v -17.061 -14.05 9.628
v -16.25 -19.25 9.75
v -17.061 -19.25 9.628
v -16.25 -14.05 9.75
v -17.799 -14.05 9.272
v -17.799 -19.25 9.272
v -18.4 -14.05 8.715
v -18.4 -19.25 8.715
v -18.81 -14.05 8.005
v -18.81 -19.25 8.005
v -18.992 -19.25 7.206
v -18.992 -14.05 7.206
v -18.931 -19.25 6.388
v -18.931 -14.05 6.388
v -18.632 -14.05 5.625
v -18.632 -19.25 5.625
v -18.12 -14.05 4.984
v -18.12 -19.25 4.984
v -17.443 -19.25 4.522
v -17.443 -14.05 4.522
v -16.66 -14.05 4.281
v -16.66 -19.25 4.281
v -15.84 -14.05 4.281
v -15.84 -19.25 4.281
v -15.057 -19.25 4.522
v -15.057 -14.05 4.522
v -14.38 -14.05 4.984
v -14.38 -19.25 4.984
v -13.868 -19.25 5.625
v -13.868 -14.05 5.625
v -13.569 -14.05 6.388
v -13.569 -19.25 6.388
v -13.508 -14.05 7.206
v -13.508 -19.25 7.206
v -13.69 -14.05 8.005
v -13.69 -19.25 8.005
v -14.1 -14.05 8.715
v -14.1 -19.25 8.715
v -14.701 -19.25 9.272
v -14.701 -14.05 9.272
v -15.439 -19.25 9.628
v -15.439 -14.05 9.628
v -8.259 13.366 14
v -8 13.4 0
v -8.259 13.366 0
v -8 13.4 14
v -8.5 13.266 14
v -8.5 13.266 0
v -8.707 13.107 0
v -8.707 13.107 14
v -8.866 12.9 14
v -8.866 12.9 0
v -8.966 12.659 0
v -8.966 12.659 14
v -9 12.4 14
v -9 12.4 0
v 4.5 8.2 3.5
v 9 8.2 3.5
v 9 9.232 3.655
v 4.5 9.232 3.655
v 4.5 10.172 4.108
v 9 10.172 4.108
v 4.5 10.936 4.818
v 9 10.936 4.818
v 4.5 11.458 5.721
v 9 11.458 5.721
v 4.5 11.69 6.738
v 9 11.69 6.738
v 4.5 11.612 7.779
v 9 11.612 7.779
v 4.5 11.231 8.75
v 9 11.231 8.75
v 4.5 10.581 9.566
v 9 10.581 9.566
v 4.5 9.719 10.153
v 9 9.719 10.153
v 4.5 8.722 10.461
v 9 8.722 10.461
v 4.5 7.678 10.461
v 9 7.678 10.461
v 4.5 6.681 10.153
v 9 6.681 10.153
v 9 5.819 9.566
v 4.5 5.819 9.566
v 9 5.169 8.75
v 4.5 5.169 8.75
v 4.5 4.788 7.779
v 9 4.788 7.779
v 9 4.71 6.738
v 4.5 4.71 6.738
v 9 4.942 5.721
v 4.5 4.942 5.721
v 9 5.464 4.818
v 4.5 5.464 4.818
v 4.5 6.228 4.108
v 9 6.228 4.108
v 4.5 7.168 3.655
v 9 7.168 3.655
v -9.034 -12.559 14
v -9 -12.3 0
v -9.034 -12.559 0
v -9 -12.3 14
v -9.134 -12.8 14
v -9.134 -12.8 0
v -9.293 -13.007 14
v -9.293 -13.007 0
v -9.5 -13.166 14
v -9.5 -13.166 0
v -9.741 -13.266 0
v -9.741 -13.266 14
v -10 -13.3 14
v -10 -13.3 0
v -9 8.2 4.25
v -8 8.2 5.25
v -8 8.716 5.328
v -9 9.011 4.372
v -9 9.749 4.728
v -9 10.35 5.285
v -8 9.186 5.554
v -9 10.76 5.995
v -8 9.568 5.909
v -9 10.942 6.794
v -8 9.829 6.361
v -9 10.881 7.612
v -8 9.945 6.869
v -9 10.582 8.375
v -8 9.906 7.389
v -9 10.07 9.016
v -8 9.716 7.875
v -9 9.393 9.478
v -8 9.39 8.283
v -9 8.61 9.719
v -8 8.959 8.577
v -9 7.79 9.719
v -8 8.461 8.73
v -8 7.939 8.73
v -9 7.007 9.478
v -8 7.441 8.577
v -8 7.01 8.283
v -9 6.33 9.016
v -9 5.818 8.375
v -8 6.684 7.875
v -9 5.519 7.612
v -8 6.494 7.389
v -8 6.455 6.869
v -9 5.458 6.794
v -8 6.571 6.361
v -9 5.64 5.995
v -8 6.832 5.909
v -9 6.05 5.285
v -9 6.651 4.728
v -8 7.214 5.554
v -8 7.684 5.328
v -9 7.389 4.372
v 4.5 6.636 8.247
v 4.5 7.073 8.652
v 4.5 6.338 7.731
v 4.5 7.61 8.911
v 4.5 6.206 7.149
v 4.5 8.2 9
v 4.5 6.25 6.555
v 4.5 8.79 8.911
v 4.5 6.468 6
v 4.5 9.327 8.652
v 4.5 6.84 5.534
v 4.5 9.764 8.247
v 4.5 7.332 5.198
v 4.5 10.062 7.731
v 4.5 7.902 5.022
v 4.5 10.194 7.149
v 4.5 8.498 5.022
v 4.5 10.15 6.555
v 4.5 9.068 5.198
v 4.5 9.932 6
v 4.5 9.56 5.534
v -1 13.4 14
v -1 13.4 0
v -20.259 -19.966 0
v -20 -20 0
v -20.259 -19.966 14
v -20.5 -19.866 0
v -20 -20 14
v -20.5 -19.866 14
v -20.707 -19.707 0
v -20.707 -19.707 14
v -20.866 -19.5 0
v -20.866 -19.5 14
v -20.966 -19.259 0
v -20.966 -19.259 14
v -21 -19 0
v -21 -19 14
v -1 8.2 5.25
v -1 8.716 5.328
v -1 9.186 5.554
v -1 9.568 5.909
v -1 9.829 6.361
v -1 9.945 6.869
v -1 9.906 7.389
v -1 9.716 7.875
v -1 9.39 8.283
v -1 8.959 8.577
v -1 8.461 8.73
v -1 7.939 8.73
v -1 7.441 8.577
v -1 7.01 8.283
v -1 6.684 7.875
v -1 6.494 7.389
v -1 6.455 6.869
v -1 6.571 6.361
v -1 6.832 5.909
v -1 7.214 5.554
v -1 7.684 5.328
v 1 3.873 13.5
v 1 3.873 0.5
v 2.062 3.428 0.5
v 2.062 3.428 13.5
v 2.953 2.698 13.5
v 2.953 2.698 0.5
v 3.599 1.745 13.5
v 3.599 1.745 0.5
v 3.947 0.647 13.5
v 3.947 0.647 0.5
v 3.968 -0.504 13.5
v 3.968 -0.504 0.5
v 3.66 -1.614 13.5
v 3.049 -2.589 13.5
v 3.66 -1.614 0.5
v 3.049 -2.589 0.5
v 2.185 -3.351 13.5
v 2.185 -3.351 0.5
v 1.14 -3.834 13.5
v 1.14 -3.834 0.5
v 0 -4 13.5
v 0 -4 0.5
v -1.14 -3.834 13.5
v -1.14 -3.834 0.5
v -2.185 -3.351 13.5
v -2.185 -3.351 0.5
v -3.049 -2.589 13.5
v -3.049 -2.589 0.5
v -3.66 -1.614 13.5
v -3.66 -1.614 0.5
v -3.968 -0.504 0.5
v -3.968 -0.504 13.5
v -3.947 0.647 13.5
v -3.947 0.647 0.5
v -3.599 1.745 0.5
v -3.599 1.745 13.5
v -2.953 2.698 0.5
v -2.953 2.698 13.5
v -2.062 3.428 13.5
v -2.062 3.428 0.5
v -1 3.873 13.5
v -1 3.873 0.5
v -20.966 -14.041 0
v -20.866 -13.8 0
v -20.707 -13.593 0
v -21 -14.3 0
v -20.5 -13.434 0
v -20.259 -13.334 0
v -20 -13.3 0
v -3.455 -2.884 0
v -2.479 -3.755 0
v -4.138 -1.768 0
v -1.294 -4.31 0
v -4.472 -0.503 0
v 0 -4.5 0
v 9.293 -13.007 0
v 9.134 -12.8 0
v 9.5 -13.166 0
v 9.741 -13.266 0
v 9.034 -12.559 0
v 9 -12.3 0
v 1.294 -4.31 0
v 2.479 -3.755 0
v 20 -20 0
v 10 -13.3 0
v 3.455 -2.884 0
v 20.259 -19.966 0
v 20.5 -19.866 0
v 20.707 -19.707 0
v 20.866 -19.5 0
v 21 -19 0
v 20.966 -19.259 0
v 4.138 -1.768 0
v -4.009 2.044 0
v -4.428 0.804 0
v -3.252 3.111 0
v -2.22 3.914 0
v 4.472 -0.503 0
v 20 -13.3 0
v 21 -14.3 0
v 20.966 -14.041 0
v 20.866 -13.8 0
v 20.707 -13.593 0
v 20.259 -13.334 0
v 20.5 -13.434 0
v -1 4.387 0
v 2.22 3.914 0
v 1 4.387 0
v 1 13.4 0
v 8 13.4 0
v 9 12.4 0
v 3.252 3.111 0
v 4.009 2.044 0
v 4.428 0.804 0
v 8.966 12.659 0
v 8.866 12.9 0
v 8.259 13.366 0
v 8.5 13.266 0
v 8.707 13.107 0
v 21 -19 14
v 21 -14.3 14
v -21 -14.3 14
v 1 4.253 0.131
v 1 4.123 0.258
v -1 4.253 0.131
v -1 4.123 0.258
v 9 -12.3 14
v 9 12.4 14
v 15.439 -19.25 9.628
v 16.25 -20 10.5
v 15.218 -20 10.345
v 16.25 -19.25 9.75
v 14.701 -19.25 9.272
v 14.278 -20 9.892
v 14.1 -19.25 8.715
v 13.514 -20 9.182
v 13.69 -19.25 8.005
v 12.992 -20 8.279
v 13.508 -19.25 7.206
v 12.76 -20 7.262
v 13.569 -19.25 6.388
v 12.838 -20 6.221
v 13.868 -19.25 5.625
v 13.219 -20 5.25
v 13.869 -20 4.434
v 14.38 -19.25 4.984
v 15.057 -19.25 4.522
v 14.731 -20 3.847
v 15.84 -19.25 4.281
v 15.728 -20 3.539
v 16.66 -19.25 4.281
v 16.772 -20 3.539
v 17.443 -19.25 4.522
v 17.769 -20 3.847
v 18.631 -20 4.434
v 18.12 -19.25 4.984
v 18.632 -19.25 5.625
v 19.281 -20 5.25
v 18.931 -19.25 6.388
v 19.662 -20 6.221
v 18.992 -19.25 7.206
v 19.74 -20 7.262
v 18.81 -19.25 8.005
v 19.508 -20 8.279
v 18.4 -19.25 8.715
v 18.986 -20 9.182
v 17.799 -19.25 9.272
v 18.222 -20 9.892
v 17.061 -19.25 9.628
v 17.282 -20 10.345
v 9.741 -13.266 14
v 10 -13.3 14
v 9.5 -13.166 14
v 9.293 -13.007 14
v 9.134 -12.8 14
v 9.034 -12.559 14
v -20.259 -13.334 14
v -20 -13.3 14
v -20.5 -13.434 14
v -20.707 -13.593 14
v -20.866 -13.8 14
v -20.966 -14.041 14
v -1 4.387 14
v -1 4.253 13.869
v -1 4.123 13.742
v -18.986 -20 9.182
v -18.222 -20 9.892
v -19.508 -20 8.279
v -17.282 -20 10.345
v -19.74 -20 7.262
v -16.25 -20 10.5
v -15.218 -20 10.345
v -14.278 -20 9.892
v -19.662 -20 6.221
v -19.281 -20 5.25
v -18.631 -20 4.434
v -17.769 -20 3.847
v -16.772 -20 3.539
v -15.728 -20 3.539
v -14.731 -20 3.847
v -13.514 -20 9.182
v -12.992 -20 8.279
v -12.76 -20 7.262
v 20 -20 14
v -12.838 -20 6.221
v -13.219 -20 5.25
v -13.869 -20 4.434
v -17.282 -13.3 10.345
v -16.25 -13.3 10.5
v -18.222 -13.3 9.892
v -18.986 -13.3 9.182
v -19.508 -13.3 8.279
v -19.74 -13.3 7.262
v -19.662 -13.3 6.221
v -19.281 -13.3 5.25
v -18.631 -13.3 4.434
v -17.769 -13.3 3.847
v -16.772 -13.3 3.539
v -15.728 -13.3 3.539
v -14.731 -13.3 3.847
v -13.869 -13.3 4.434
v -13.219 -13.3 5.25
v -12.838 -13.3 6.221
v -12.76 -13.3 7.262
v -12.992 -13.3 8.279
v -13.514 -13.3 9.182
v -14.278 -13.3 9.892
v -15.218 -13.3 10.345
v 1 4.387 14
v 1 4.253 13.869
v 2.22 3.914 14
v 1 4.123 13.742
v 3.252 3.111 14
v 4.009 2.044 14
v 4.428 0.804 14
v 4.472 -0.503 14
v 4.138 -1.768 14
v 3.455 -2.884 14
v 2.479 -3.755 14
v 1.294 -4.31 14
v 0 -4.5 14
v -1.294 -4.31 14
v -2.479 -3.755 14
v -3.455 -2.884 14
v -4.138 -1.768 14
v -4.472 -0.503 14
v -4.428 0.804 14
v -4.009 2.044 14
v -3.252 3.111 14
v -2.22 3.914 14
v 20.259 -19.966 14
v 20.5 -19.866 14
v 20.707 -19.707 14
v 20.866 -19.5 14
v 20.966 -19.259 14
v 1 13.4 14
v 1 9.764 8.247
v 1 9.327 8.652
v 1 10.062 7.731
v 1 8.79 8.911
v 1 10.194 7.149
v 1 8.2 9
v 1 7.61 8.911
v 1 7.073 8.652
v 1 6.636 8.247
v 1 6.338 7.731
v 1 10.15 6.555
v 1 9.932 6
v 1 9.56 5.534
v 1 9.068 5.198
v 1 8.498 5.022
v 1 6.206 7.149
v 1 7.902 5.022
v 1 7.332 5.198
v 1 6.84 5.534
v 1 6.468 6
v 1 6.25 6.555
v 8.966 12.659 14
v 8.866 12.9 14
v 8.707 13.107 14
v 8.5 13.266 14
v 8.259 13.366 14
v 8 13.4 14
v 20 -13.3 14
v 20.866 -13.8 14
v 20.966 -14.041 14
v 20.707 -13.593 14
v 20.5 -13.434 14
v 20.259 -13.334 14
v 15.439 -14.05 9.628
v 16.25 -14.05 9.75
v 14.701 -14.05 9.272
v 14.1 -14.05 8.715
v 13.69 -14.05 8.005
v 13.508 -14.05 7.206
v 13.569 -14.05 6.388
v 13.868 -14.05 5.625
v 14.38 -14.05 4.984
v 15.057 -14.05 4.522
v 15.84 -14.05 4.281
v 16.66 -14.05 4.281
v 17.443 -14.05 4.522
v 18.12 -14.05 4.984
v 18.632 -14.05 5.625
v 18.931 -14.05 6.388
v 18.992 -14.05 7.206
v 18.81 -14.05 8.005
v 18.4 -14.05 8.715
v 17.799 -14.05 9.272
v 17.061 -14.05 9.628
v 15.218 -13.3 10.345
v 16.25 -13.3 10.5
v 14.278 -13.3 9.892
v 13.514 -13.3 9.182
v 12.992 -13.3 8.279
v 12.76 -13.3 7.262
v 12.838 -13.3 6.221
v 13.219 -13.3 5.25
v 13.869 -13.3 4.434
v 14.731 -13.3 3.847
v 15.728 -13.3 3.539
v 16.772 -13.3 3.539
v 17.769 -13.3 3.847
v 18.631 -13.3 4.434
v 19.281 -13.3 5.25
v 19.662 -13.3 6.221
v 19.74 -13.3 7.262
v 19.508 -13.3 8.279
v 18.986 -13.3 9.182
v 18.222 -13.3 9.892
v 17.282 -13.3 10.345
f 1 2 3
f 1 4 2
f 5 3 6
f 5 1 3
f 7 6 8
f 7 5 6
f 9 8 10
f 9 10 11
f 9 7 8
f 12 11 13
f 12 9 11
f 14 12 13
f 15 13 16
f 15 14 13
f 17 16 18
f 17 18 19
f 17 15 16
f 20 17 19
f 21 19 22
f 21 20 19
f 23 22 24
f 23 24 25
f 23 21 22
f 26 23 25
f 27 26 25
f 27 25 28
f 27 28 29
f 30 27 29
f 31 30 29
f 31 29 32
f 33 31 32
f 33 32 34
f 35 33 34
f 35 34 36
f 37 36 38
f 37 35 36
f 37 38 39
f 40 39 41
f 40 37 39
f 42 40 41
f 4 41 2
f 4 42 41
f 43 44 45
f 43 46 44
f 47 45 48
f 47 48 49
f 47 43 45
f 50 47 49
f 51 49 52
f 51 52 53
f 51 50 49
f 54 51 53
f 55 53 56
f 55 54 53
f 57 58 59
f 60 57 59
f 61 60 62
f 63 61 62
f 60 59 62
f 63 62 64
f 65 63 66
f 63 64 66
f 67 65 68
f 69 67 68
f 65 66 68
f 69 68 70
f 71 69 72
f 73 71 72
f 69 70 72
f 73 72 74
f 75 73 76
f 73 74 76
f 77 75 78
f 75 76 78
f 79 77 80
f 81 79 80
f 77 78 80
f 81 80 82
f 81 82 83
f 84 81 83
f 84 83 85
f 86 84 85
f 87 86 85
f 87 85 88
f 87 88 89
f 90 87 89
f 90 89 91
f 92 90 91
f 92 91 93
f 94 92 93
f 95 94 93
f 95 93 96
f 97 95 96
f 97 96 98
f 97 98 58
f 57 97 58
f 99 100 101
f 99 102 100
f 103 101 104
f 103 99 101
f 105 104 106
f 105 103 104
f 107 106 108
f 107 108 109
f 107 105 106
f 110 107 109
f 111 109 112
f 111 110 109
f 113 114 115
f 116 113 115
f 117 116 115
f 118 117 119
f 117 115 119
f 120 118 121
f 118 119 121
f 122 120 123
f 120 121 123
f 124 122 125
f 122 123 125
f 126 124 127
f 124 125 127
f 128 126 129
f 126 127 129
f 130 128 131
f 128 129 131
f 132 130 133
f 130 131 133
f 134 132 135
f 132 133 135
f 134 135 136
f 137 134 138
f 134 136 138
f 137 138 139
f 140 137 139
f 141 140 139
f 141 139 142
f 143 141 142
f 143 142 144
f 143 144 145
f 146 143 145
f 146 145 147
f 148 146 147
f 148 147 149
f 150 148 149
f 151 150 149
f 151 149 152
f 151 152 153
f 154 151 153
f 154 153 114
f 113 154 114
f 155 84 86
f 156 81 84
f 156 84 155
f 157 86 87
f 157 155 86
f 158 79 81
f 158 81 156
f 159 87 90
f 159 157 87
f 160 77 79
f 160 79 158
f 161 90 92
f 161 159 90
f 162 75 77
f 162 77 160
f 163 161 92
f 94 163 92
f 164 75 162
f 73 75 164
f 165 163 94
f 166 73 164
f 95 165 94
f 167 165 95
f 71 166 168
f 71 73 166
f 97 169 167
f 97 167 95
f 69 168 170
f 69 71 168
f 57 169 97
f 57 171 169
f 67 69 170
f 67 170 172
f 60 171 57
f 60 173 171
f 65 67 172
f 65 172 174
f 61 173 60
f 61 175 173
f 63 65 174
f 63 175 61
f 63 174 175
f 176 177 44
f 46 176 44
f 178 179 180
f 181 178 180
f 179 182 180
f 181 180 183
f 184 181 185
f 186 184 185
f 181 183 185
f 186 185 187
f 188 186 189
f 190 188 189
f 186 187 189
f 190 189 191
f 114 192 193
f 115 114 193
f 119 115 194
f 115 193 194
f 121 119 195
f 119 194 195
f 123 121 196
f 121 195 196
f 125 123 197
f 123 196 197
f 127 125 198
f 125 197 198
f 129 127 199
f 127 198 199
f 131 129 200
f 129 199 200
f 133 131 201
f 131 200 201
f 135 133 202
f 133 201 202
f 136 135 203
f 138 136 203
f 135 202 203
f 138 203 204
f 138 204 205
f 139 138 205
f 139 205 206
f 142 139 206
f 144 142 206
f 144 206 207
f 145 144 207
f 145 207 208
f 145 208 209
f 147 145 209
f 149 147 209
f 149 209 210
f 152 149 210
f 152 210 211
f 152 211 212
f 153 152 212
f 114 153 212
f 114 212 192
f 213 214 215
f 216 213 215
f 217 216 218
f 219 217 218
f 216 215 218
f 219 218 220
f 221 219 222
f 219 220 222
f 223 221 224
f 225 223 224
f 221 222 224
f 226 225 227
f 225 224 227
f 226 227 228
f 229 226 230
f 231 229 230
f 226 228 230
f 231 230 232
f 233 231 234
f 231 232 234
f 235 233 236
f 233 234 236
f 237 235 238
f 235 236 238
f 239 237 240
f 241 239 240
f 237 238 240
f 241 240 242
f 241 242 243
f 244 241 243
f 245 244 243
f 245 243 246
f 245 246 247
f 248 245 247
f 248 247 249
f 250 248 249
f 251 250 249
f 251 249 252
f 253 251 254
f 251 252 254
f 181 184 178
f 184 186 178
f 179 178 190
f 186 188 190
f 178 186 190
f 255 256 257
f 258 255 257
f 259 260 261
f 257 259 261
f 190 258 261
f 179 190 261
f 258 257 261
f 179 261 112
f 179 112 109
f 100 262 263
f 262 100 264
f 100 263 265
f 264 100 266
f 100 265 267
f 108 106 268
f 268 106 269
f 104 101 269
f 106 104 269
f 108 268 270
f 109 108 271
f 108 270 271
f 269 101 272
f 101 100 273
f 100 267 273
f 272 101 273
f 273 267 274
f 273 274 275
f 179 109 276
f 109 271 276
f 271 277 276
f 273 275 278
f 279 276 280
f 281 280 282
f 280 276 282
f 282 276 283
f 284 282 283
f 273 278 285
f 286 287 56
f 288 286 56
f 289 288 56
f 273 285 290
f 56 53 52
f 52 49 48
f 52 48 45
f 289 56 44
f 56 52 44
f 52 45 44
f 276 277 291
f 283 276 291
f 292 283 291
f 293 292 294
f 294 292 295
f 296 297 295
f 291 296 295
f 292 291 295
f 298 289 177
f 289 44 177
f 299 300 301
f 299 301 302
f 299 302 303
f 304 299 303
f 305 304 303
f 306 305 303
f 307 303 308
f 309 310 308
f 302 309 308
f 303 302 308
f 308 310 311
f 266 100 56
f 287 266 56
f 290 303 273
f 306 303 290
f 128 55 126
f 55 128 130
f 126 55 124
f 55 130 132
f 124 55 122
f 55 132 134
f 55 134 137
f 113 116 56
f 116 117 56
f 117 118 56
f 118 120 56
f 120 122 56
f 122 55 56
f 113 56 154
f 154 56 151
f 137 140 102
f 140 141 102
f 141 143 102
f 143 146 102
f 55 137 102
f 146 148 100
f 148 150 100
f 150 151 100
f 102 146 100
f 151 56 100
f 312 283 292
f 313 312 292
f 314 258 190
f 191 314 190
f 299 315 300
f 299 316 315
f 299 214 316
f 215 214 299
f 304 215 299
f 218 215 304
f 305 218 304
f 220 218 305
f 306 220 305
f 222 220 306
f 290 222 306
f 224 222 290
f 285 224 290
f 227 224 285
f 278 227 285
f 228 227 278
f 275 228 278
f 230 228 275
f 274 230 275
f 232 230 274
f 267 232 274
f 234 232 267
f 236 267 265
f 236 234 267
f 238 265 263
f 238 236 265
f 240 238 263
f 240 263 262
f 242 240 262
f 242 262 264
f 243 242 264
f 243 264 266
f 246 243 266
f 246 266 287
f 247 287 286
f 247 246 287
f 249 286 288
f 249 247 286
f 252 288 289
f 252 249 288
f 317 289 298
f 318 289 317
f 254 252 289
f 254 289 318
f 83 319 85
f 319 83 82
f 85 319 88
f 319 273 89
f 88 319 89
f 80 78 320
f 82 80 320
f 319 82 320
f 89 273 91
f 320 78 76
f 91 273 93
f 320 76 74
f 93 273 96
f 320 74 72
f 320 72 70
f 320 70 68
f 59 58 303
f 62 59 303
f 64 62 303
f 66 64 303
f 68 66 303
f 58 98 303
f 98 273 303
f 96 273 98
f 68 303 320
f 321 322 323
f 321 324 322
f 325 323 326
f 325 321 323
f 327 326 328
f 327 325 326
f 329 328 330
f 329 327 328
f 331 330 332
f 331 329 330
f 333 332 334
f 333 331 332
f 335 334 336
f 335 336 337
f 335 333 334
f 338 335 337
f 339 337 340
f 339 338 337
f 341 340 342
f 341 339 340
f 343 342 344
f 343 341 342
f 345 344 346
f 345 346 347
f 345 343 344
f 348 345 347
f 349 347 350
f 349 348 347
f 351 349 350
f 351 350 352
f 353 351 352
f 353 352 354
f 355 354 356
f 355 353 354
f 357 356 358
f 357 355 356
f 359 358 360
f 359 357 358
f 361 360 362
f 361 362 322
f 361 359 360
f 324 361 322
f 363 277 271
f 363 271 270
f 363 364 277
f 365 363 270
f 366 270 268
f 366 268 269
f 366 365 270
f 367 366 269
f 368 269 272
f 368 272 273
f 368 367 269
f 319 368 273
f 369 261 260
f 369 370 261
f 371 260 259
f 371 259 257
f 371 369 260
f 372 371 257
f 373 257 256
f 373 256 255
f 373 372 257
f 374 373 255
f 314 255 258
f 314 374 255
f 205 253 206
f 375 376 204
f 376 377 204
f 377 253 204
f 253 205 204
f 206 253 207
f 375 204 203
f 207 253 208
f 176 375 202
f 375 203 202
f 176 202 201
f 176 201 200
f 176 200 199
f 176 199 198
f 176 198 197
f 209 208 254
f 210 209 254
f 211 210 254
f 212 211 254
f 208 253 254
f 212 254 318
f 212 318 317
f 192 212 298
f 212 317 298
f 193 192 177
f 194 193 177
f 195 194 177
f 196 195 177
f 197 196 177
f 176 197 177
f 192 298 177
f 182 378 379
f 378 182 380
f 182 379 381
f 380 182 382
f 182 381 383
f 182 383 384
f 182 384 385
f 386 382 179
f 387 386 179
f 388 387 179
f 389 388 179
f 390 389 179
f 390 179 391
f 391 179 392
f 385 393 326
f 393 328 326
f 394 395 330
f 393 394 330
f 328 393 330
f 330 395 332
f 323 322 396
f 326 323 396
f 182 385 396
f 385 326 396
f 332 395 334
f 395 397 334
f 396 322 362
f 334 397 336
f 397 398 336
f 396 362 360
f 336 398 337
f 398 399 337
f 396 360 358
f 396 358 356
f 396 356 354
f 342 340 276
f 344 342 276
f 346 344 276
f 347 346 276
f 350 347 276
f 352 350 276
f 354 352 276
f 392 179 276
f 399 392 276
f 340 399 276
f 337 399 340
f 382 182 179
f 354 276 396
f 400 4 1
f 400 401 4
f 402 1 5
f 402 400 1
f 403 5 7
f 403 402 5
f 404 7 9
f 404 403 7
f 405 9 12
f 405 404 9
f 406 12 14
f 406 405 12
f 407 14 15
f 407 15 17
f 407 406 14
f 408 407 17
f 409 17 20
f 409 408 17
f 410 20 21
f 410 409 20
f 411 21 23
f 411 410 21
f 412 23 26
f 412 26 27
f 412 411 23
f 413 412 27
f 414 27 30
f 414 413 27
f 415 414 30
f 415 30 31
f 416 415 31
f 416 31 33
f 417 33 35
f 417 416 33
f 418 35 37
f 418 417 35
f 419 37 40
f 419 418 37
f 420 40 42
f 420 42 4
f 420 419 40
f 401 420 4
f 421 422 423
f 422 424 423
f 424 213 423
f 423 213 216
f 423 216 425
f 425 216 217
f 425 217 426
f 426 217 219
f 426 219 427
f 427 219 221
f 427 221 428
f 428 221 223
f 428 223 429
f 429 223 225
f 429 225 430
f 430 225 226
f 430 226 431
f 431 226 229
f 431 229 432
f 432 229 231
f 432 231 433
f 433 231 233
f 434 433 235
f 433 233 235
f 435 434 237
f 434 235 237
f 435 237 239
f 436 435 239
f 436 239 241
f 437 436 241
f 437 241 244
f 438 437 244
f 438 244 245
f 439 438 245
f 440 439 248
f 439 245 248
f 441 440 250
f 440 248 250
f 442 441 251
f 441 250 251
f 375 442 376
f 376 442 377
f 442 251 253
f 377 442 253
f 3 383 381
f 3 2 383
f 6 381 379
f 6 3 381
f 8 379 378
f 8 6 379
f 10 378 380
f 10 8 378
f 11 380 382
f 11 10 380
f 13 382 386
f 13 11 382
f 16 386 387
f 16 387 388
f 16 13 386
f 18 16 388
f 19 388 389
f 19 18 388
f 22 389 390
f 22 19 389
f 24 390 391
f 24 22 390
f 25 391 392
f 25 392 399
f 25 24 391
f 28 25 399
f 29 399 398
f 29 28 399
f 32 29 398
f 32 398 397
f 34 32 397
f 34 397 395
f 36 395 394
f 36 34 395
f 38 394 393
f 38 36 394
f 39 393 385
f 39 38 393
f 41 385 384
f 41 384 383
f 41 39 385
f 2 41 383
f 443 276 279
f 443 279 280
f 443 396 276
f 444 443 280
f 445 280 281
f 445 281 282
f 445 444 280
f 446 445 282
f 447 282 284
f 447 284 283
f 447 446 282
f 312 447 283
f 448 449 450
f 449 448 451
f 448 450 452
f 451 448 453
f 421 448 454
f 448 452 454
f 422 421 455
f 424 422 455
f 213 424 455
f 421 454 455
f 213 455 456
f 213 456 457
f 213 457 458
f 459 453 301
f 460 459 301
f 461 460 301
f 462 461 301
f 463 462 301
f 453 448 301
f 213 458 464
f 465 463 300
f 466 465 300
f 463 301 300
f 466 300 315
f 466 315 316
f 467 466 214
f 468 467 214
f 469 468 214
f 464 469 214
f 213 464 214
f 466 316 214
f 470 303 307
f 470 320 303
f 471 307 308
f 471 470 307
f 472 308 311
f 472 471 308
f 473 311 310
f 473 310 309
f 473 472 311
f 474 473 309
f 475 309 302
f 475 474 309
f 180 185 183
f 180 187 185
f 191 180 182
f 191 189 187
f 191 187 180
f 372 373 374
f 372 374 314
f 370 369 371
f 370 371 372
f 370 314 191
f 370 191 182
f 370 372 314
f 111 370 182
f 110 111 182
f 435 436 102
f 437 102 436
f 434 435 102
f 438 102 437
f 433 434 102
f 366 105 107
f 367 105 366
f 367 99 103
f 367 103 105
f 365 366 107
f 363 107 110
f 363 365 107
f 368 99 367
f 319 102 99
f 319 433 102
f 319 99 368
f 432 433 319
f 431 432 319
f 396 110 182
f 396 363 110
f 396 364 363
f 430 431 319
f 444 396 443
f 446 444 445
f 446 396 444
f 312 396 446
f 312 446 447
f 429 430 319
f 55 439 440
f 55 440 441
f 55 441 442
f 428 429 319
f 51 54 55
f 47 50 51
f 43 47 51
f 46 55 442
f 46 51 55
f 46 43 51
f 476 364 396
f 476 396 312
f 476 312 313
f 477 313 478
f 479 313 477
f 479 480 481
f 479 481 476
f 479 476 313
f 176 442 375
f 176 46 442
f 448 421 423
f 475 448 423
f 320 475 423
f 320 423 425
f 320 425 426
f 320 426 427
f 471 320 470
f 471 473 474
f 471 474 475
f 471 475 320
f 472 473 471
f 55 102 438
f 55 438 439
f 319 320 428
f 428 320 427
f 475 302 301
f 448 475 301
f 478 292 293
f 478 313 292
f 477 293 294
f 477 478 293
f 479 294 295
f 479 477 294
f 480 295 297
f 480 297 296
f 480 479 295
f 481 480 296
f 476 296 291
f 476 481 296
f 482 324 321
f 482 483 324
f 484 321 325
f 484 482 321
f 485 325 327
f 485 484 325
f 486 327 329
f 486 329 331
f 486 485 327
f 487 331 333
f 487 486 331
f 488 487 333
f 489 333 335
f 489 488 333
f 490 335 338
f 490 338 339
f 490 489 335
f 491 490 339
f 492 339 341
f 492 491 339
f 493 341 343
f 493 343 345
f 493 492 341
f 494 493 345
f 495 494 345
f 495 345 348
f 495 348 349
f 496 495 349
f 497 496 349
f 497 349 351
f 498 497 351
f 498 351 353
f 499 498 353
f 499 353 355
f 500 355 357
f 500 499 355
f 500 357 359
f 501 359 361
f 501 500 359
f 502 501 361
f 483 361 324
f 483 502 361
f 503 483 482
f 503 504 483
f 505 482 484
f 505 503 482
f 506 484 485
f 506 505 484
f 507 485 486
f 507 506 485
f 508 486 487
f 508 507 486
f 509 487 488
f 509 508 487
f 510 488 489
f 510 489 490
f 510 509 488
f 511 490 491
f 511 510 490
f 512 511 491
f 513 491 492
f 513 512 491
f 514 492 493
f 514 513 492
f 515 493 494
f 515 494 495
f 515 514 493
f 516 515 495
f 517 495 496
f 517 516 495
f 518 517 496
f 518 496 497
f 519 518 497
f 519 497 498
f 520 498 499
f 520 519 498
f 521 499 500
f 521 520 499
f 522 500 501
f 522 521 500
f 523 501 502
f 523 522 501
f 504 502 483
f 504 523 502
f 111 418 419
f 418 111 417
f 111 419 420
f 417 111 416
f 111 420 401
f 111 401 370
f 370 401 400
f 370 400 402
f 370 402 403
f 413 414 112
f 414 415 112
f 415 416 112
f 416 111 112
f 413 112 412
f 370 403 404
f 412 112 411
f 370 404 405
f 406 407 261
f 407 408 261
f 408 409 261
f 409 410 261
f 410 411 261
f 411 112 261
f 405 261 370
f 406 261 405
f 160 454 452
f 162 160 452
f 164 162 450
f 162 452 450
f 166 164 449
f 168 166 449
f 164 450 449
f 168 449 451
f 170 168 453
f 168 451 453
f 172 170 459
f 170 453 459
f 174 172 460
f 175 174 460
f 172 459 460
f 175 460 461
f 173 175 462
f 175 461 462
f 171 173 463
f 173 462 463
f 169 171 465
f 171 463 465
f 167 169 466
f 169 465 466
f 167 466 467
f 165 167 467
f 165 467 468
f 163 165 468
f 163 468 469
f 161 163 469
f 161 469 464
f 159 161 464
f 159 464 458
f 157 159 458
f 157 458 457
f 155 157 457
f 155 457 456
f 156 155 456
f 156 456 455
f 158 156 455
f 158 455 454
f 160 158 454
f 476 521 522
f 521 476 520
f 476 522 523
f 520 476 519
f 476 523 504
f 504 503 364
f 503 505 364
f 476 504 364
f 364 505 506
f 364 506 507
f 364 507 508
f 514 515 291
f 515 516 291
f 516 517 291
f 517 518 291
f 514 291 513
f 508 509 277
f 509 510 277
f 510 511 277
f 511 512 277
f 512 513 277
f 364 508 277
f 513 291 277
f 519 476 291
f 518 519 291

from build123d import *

# Parameters (mm, degrees)
BOSS_EXTRUDE1_DEPTH                     = 14
FILLET1_R                               = 1
CBORE_FOR_M5_HEX_HEAD_BOLT1_D           = 4
CBORE_FOR_M5_HEX_HEAD_BOLT1_DEPTH       = 8
CBORE_FOR_M5_HEX_HEAD_BOLT1_CBORE_D     = 7
CBORE_FOR_M5_HEX_HEAD_BOLT1_CBORE_DEPTH = 4.5
M5_TAPPED_HOLE1_D                       = 3.5
M5_TAPPED_HOLE1_DEPTH                   = 8
M5_TAPPED_HOLE1_CSINK_D                 = 5.5
M5_TAPPED_HOLE1_CSINK_ANGLE             = 90
CHAMFER1_SIZE                           = 0.5


with BuildPart() as part:
    # Sketch1 → Boss-Extrude1 (new body)
    with BuildSketch(Plane.XY):
        with BuildLine():
            Line((-21, -20), (21, -20))
            Line((21, -20), (21, -13.3))
            Line((21, -13.3), (9, -13.3))
            Line((9, -13.3), (9, 13.4))
            Line((9, 13.4), (1, 13.4))
            Line((1, 13.4), (1, 3.872983346))
            ThreePointArc((1, 3.872983346), (0, -4), (-1, 3.872983346))
            Line((-1, 3.872983346), (-1, 13.4))
            Line((-1, 13.4), (-9, 13.4))
            Line((-9, 13.4), (-9, -13.3))
            Line((-9, -13.3), (-21, -13.3))
            Line((-21, -13.3), (-21, -20))
        make_face()
    extrude(amount=BOSS_EXTRUDE1_DEPTH)

    # Fillet1
    fillet1_edges = [part.edges().sort_by_distance(p)[0] for p in [
        (-21, -13.3, 7),
        (-9, -13.3, 7),
        (-9, 13.4, 7),
        (9, 13.4, 7),
        (9, -13.3, 7),
        (21, -13.3, 7),
        (21, -20, 7),
        (-21, -20, 7),
    ]]
    fillet(fillet1_edges, radius=FILLET1_R)

    # CBORE for M5 Hex Head Bolt1
    with Locations(Plane(origin=(9, 0, 0), x_dir=(0, 0, -1), z_dir=(1, 0, 0))):
        with Locations((-7, 8.2)):
            CounterBoreHole(CBORE_FOR_M5_HEX_HEAD_BOLT1_D / 2, CBORE_FOR_M5_HEX_HEAD_BOLT1_CBORE_D / 2, CBORE_FOR_M5_HEX_HEAD_BOLT1_CBORE_DEPTH, depth=CBORE_FOR_M5_HEX_HEAD_BOLT1_DEPTH)

    # M5 Tapped Hole1
    with Locations(Plane.ZY.offset(9)):
        with Locations((7, 8.2)):
            CounterSinkHole(M5_TAPPED_HOLE1_D / 2, M5_TAPPED_HOLE1_CSINK_D / 2, depth=M5_TAPPED_HOLE1_DEPTH, counter_sink_angle=M5_TAPPED_HOLE1_CSINK_ANGLE)

    # Sketch8 → CSK for M5 Countersunk Flat Head Screw2 (revolve, cut)
    with BuildSketch(Plane(origin=(16.25, -13.3, 7), x_dir=(0, 0, 1), z_dir=(1, 0, 0))):
        Polygon((0, 0), (0, 6.7), (3.5, 6.7), (2.75, 5.95), (2.75, 0.75), (3.5, 0), align=None)
    revolve(axis=Axis((16.25, -6.95, 7), (0, -1, 0)), mode=Mode.SUBTRACT)

    # Sketch10 → CSK for M5 Countersunk Flat Head Screw3 (revolve, cut)
    with BuildSketch(Plane(origin=(-16.25, -13.3, 7), x_dir=(0, 0, 1), z_dir=(1, 0, 0))):
        Polygon((0, 0), (0, 6.7), (3.5, 6.7), (2.75, 5.95), (2.75, 0.75), (3.5, 0), align=None)
    revolve(axis=Axis((-16.25, -6.95, 7), (0, -1, 0)), mode=Mode.SUBTRACT)

    # Chamfer1
    chamfer1_edges = [part.edges().sort_by_distance(p)[0] for p in [
        (0, -4, 0),
        (0, -4, 14),
    ]]
    chamfer(chamfer1_edges, length=CHAMFER1_SIZE)


solid = part.part
